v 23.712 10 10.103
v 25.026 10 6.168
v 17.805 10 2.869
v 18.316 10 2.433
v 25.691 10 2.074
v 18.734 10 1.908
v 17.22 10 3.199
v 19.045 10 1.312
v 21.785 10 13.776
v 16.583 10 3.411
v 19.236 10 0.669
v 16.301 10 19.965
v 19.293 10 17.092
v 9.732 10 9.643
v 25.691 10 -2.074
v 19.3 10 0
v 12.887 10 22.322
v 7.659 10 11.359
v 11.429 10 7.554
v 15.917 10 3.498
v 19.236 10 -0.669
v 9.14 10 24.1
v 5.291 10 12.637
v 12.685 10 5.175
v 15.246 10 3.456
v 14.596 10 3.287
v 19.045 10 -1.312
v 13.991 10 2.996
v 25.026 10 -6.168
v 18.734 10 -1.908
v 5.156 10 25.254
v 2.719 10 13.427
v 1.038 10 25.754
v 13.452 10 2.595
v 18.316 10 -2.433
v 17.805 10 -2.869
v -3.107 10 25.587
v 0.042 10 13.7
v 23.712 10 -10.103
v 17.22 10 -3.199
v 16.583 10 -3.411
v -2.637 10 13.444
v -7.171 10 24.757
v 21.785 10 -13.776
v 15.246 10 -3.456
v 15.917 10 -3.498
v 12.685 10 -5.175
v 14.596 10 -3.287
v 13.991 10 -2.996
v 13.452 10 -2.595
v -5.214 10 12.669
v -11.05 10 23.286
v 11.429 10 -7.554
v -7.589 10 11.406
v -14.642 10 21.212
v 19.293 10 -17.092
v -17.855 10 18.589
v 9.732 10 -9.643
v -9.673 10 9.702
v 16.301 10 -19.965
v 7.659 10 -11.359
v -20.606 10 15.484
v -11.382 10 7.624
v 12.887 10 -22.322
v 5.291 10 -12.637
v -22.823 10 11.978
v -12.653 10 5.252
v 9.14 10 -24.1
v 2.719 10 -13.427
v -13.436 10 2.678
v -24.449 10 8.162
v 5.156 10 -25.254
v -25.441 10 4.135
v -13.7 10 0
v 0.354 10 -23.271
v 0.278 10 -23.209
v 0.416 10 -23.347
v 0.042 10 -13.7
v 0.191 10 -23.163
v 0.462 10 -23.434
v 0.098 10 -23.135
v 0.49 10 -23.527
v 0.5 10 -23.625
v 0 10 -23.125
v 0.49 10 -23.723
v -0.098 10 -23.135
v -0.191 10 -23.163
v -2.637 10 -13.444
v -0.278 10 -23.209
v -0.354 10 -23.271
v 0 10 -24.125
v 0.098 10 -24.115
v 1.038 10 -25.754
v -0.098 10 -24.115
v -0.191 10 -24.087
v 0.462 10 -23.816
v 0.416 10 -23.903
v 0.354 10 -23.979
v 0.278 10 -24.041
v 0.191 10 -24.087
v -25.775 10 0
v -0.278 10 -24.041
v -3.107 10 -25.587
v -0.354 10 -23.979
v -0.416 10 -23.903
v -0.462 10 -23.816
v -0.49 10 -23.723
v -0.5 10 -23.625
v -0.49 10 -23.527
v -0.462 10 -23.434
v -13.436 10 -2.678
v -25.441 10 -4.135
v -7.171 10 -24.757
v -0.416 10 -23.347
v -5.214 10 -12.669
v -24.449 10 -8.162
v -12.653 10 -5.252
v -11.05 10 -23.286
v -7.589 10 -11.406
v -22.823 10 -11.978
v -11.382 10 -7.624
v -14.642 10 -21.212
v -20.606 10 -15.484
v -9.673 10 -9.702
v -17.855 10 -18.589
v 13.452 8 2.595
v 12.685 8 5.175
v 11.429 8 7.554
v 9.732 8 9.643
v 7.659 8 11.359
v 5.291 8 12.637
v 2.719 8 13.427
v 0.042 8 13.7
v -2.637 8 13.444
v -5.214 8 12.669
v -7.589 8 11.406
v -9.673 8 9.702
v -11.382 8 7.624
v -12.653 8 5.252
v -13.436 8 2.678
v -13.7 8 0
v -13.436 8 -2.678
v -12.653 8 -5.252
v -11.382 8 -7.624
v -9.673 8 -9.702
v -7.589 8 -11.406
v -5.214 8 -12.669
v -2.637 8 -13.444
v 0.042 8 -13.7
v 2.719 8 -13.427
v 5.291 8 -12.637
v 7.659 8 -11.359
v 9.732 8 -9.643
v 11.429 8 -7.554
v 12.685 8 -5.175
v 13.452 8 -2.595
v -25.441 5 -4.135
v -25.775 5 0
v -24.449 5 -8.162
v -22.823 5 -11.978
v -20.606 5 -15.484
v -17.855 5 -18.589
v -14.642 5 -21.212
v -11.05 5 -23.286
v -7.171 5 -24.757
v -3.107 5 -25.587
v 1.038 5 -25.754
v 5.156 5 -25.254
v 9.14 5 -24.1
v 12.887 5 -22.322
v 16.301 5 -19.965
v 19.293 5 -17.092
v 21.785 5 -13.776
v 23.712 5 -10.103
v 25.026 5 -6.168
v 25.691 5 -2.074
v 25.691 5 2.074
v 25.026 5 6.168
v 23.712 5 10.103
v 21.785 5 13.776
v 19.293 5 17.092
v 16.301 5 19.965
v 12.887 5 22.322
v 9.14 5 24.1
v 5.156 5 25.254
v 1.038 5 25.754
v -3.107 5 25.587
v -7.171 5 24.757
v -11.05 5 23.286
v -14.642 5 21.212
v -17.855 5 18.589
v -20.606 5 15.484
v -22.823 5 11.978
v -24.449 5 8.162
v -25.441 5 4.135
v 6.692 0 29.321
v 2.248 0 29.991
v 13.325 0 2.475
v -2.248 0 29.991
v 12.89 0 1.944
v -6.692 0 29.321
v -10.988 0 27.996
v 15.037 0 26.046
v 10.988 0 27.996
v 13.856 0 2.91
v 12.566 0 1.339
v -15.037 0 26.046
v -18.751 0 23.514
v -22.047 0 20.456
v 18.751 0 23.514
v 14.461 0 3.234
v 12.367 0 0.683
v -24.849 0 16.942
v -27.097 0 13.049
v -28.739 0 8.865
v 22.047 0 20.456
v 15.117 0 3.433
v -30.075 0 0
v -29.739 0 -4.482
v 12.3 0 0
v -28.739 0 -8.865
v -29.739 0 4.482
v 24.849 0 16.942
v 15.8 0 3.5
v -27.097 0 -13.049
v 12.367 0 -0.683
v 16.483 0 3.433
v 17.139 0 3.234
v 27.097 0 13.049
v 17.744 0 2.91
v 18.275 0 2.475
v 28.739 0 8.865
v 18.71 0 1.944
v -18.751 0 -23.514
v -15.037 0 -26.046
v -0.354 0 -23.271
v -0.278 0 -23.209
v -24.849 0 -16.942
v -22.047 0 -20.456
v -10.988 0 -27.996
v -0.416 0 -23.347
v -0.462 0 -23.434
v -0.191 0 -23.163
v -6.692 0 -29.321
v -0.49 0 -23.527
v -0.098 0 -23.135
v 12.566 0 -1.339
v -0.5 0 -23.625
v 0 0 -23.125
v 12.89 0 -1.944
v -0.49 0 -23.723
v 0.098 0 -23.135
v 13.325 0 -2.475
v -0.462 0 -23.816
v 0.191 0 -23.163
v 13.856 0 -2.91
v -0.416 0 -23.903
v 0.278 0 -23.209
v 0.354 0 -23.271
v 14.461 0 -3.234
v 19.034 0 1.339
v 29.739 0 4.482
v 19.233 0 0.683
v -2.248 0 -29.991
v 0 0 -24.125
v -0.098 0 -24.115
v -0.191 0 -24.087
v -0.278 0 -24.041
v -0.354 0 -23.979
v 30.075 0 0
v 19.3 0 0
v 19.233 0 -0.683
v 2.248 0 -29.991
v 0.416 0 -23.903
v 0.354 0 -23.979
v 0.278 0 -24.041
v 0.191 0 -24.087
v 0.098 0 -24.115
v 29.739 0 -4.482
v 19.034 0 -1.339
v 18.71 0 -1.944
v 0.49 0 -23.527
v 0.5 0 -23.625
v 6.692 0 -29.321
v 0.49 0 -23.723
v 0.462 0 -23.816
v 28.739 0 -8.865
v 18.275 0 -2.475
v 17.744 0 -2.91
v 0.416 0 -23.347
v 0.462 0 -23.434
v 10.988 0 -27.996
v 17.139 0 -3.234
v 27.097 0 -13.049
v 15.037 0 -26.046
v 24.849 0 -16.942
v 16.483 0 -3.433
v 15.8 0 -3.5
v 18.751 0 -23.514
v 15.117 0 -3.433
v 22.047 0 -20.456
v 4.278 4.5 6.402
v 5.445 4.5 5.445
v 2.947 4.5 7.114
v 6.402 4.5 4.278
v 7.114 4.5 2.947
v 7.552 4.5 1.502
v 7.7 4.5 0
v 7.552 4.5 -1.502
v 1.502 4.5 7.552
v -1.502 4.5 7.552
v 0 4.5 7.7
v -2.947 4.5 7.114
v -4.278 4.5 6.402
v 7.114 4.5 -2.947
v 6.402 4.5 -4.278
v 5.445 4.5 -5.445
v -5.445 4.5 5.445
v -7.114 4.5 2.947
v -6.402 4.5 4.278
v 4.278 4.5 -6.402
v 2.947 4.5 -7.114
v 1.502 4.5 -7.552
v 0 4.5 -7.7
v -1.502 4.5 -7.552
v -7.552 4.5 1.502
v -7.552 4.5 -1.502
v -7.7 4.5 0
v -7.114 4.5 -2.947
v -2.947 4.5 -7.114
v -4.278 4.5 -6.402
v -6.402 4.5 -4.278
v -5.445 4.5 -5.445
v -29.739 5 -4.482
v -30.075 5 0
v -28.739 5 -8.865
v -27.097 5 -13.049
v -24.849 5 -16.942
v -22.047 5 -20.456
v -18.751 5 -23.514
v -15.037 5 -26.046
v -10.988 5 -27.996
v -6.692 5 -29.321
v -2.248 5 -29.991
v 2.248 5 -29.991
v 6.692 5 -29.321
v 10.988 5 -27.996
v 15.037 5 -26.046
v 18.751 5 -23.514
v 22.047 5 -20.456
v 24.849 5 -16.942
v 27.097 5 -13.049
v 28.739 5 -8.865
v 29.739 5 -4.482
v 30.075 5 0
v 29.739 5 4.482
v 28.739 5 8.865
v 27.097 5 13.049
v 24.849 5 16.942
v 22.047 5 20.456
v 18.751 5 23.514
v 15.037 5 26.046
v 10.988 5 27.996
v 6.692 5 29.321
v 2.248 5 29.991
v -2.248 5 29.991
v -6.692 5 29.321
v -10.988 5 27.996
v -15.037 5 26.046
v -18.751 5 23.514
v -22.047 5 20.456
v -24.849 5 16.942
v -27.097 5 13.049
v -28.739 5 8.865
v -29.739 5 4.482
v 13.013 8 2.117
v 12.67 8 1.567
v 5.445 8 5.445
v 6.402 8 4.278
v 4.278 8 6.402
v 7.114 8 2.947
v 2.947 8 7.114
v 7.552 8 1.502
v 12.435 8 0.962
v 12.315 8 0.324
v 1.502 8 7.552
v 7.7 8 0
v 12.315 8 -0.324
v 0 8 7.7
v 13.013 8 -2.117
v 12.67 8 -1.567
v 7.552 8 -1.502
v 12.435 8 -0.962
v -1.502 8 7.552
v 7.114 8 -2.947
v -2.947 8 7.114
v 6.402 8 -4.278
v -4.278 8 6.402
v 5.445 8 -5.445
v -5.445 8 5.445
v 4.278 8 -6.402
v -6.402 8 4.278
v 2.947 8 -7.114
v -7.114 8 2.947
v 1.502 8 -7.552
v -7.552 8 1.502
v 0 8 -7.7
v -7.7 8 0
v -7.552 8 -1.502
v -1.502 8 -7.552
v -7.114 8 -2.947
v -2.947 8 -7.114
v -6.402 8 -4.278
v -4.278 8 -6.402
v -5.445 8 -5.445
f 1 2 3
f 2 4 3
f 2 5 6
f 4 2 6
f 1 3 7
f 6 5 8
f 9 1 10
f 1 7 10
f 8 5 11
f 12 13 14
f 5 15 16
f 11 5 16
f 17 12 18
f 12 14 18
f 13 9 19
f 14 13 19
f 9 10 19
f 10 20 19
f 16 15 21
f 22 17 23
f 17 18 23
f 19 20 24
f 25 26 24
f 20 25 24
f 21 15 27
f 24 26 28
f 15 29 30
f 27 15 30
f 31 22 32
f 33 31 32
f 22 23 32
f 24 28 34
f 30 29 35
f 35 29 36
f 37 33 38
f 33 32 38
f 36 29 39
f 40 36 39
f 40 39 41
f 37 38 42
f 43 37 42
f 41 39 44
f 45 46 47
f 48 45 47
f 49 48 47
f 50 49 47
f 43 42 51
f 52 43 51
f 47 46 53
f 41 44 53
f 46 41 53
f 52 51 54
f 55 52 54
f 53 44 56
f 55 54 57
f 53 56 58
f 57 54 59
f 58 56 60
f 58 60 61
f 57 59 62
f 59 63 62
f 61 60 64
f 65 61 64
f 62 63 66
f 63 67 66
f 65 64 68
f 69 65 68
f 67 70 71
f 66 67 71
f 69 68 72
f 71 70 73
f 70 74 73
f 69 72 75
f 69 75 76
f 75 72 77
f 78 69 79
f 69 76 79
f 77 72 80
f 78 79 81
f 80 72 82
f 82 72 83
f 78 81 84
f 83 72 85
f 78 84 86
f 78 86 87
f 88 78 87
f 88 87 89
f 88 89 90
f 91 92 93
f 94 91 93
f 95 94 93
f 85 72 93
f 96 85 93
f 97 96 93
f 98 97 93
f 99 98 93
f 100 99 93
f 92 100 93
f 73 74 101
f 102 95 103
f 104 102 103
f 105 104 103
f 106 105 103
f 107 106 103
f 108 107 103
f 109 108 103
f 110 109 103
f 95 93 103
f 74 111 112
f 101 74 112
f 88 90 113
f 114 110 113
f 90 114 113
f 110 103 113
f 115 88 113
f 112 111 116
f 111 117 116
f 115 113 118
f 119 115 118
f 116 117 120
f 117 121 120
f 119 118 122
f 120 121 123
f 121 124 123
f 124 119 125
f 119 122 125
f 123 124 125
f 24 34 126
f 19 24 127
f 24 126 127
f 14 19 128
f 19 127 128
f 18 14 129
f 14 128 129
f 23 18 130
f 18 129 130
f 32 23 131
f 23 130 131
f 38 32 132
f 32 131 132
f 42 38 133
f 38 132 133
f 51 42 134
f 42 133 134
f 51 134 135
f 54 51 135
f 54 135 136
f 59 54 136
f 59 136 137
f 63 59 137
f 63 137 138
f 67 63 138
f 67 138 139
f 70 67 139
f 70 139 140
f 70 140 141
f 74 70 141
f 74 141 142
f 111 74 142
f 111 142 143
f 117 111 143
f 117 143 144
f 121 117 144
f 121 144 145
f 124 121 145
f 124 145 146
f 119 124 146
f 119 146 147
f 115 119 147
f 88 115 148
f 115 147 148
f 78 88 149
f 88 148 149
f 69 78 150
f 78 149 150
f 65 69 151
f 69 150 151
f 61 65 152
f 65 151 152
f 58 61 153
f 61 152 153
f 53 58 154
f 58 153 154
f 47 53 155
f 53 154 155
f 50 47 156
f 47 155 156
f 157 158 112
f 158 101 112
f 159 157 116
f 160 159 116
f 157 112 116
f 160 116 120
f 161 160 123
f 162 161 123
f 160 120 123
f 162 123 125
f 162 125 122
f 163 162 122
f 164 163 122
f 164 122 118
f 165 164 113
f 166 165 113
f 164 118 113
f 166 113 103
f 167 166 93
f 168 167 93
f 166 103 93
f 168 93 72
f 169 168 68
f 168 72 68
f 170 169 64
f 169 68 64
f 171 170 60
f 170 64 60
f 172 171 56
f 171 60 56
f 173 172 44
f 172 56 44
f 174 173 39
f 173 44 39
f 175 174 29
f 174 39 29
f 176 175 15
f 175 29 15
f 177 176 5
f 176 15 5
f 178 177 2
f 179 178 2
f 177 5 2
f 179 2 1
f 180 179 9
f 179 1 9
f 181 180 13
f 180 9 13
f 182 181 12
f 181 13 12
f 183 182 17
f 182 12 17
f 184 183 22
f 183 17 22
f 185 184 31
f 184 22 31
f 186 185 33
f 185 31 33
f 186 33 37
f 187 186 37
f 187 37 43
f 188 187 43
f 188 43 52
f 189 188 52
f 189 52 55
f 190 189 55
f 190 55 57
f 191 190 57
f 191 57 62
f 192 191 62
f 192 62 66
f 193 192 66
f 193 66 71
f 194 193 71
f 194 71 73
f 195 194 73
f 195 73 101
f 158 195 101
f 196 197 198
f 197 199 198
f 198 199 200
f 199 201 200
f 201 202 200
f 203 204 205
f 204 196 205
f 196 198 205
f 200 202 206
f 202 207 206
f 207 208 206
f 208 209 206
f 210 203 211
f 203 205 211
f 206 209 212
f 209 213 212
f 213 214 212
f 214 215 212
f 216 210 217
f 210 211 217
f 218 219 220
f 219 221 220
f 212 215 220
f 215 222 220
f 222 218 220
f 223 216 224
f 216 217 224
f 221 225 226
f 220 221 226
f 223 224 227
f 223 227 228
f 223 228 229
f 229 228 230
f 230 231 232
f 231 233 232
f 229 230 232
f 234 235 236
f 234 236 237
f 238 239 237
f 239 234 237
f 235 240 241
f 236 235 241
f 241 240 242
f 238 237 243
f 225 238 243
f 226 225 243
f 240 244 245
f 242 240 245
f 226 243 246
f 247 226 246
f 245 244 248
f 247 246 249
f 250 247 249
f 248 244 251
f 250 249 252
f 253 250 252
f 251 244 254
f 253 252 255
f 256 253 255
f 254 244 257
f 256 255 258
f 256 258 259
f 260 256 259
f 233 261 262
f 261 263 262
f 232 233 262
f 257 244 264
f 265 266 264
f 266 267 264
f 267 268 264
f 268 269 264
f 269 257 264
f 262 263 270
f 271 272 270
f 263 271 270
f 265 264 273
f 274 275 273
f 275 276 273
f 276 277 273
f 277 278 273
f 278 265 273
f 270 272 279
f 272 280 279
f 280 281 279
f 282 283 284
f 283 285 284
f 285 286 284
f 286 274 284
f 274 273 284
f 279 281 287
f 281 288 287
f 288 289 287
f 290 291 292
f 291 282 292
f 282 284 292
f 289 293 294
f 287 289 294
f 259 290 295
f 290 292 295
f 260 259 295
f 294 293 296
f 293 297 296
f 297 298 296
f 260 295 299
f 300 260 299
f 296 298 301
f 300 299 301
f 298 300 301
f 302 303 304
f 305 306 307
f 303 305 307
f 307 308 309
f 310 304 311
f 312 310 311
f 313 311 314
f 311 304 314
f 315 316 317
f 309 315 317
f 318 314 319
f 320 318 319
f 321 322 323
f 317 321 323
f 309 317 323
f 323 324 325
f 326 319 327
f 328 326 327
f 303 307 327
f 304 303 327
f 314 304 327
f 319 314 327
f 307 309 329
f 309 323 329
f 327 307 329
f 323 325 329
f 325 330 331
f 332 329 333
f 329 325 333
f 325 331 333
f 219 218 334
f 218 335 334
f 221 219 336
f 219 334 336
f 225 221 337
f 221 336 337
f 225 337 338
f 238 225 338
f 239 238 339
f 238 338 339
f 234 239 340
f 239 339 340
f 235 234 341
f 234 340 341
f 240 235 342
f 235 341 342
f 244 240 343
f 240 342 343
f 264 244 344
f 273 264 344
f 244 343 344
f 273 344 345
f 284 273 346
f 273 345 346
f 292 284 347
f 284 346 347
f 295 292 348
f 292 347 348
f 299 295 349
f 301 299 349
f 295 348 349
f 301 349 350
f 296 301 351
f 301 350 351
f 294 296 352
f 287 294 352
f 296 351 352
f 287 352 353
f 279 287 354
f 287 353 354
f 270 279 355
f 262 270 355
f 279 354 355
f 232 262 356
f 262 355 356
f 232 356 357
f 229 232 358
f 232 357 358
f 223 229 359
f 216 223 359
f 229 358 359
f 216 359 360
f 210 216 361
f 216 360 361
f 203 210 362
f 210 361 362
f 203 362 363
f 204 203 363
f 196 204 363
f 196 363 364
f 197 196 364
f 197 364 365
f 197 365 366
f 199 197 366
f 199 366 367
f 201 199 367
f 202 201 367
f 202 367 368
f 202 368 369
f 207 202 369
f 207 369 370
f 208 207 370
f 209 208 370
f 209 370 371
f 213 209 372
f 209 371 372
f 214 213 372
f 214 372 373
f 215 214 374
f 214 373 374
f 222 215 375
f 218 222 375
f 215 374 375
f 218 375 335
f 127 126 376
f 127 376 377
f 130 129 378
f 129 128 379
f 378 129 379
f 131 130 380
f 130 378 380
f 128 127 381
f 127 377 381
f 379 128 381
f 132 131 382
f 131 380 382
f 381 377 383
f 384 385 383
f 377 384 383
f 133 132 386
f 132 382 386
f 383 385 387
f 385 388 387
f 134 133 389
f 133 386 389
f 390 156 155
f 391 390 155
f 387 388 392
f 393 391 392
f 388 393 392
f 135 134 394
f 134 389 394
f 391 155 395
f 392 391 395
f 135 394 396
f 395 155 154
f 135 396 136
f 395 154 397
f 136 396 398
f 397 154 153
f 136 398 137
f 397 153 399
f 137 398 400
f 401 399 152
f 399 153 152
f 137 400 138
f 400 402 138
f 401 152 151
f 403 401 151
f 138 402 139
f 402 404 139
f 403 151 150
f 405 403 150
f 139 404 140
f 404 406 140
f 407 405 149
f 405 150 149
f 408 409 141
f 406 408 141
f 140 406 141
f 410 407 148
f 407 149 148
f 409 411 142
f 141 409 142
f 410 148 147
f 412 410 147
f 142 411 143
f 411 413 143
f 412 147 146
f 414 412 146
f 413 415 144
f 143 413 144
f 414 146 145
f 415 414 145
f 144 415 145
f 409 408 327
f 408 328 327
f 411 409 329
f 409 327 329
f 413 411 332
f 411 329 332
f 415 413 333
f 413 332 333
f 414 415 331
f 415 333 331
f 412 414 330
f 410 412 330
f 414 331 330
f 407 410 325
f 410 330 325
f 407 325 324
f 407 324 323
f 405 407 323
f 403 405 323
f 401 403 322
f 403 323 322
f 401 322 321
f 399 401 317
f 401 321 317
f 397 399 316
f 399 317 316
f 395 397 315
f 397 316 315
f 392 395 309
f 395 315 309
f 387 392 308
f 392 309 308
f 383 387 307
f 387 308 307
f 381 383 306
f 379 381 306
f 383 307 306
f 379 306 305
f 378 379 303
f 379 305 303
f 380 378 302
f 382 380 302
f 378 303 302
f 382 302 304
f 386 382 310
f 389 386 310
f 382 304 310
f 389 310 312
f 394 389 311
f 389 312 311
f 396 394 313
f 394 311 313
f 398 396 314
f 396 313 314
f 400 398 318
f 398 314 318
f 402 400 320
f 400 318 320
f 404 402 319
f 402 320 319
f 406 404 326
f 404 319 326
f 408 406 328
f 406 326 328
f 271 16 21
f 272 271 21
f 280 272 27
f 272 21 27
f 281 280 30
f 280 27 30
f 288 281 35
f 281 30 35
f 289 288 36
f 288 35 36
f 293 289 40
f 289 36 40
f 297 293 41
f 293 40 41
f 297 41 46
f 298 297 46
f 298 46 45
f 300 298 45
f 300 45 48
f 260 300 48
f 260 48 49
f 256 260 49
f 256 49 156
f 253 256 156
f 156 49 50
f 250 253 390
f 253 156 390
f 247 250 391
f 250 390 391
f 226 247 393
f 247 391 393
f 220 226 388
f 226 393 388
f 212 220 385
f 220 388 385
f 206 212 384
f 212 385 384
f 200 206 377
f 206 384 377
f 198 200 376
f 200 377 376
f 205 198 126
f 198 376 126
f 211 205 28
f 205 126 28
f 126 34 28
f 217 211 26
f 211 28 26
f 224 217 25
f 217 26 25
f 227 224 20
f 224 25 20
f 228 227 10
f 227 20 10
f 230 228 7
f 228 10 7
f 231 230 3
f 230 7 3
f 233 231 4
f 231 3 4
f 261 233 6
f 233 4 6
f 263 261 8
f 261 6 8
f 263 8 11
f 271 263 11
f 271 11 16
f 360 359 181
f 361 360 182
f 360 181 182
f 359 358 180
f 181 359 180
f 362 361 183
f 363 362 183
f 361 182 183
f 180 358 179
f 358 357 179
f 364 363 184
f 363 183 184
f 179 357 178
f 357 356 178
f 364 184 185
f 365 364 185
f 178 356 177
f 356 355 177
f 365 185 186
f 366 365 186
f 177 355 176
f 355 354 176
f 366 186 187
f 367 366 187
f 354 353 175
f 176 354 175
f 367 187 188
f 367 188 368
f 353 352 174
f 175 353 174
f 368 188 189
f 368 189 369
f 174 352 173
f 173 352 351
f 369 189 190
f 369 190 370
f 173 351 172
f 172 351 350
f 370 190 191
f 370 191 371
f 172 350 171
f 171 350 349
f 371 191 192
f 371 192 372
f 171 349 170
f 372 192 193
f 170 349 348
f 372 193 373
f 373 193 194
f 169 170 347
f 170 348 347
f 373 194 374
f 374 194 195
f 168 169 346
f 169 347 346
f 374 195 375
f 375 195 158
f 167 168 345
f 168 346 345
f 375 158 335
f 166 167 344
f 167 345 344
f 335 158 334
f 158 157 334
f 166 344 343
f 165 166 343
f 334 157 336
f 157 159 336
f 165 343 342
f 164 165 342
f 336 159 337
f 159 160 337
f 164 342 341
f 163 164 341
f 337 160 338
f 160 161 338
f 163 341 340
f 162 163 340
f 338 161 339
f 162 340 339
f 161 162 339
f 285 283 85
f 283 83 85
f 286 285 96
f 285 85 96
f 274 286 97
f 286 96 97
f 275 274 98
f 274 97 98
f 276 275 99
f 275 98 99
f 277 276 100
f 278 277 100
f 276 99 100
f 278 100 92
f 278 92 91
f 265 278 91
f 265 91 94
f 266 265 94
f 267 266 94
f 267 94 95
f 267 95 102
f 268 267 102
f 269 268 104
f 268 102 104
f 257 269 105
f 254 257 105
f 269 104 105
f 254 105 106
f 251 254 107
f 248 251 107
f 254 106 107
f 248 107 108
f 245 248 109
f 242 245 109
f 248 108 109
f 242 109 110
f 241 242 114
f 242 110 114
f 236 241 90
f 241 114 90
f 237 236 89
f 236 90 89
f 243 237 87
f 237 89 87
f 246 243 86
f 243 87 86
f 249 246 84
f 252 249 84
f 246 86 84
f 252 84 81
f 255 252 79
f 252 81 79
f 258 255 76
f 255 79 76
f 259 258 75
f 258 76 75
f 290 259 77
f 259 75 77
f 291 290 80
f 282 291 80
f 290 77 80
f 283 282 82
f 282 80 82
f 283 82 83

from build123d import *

# Parameters (mm, degrees)
SKETCH2_R          = 3.5
CUT_EXTRUDE1_DEPTH = 10
SKETCH3_R          = 0.5
CUT_EXTRUDE2_DEPTH = 5


with BuildPart() as part:
    # Sketch1 → Revolve1 (revolve)
    with BuildSketch(Plane.XY):
        Polygon((0, 0), (-30.075, 0), (-30.075, 5), (-25.775, 5), (-25.775, 10), (-13.7, 10), (-13.7, 8), (-7.7, 8), (-7.7, 4.5), (0, 4.5), align=None)
    revolve(axis=Axis((0, 4.5, 0), (0, -1, 0)))

    # Sketch2 → Cut-Extrude1 (cut)
    with BuildSketch(Plane(origin=(0, 10, 0), x_dir=(1, 0, 0), z_dir=(0, 1, 0))):
        with Locations((15.8, 0)):
            Circle(SKETCH2_R)
    extrude(amount=-CUT_EXTRUDE1_DEPTH, mode=Mode.SUBTRACT)

    # Sketch3 → Cut-Extrude2 (cut, symmetric)
    with BuildSketch(Plane(origin=(0, 5, 0), x_dir=(1, 0, 0), z_dir=(0, 1, 0))):
        with Locations((0, 23.625)):
            Circle(SKETCH3_R)
    extrude(amount=CUT_EXTRUDE2_DEPTH, both=True, mode=Mode.SUBTRACT)


solid = part.part
